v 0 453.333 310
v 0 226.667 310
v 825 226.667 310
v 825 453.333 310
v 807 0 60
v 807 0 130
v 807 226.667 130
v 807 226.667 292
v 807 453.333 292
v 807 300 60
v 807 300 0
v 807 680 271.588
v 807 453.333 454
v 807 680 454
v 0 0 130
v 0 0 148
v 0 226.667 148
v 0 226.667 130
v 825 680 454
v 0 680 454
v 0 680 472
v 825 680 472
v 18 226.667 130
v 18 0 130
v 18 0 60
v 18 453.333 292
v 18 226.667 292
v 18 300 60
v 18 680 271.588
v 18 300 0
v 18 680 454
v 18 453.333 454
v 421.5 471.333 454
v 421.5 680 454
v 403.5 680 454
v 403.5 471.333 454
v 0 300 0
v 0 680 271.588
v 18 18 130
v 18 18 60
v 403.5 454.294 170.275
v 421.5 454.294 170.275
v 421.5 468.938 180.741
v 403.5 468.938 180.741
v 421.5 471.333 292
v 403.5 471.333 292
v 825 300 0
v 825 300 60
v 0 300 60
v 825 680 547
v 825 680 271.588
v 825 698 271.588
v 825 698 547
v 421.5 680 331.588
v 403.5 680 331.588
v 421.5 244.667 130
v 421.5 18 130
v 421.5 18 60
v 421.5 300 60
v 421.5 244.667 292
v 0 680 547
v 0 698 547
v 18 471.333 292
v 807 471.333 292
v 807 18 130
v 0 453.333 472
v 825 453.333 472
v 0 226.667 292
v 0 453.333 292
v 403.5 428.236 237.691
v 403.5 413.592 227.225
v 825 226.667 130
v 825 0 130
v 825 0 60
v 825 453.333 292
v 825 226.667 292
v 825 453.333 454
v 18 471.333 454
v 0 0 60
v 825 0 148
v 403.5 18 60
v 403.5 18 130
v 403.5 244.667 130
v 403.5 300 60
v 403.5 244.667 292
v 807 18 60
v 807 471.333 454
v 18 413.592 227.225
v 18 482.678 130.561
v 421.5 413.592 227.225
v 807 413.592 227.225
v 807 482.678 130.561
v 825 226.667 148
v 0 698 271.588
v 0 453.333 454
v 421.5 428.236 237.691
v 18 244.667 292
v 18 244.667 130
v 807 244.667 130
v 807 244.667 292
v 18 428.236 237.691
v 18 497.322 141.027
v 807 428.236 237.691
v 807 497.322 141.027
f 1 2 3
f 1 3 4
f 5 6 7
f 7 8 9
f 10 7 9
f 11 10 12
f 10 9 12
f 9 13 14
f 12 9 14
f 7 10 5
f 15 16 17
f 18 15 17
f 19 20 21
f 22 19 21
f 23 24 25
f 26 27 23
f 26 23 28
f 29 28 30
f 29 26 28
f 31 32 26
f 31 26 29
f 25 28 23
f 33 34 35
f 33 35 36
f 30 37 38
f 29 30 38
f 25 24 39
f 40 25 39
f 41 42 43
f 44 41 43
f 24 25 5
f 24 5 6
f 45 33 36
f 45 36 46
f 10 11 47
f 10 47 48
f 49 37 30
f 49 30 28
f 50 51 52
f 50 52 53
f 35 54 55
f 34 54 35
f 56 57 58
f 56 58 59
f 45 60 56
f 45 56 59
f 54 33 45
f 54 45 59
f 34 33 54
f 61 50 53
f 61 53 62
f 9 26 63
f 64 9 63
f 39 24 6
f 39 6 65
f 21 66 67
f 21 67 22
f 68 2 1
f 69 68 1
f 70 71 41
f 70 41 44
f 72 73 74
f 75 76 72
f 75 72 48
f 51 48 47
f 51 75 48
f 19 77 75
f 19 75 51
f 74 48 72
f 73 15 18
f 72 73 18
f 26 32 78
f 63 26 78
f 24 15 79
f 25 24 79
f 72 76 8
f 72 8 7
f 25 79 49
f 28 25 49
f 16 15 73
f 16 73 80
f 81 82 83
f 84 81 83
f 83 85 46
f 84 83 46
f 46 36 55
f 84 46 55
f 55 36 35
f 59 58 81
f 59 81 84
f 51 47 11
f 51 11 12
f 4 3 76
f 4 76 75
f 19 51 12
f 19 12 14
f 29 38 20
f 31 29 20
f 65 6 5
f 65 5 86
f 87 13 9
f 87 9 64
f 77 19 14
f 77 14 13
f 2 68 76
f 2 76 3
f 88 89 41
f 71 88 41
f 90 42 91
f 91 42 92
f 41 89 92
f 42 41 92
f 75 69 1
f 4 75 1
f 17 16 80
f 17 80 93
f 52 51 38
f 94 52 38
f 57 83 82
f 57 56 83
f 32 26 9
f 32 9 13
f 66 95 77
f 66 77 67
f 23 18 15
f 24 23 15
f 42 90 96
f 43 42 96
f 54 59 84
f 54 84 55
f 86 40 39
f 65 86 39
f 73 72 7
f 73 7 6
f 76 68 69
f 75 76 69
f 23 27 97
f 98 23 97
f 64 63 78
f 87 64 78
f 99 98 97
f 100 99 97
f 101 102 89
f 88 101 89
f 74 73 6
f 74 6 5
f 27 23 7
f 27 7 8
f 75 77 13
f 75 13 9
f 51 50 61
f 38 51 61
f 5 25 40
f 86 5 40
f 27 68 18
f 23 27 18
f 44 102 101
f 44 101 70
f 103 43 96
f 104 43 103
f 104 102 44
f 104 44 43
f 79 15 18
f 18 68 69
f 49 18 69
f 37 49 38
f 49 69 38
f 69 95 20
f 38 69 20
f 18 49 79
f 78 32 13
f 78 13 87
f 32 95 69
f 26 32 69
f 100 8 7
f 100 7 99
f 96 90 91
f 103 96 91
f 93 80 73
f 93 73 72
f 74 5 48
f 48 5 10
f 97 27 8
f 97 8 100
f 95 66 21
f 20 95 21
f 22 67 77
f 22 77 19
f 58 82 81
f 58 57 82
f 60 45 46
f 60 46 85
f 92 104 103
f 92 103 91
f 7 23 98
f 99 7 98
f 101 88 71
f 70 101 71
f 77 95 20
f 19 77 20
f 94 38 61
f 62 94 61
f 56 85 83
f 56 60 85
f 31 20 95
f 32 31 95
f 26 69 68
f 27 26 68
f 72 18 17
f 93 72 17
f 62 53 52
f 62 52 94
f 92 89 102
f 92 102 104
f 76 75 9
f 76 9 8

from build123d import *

# Parameters (mm, degrees)
F0_W           = 226.6666666667
F0_H           = 18
F1_DEPTH       = 825
F4_DEPTH       = 18
F8_W           = 18
F8_H           = 130
F9_DEPTH       = 789
F8_H_2         = 162
F10_W          = 825
F10_H          = 275.4117647059
F11_DEPTH      = 18
F2_W           = 300
F2_H           = 60
F12_DEPTH      = 825.001
F14_DEPTH      = 9
F16_W          = 789
F16_H          = 18
F17_DEPTH      = 48.8143056074
F17_DEPTH_BACK = 70


with BuildPart() as f1:
    # F0 (on Right) → F1 (new body)
    with BuildSketch(Plane.YZ):
        with Locations((340, 301)):
            Rectangle(F0_W, F0_H)
    extrude(amount=F1_DEPTH)


with BuildPart() as f1b:
    # F0 (on Right) → F1, piece 2 (new body)
    with BuildSketch(Plane.YZ):
        with Locations((566.6666666667, 463)):
            Rectangle(F0_W, F0_H)
    extrude(amount=F1_DEPTH)


with BuildPart() as f1c:
    # F0 (on Right) → F1, piece 3 (new body)
    with BuildSketch(Plane.YZ):
        with Locations((113.3333333333, 139)):
            Rectangle(F0_W, F0_H)
    extrude(amount=F1_DEPTH)


with BuildPart() as f4:
    # F3 (on Right) → F4 (new body)
    with BuildSketch(Plane.YZ):
        Polygon((0, 0), (300, 0), (680, 271.5882352941), (680, 454), (453.3333333333, 454), (453.3333333333, 292), (226.6666666667, 292), (226.6666666667, 130), (0, 130), align=None)
    extrude(amount=F4_DEPTH)


with BuildPart() as f7_1:
    # F7: instance of F4
    add(f4.part.mirror(Plane.YZ.offset(412.5)))


with BuildPart() as f9:
    # F8 (on face) → F9 (new body, through all)
    with BuildSketch(Plane.YZ.offset(18)):
        with Locations((9, 65)):
            Rectangle(F8_W, F8_H)
    extrude(amount=F9_DEPTH)


with BuildPart() as f9b:
    # F8 (on face) → F9, piece 2 (new body, through all)
    with BuildSketch(Plane.YZ.offset(18)):
        with Locations((235.6666666667, 211)):
            Rectangle(F8_W, F8_H_2)
    extrude(amount=F9_DEPTH)


with BuildPart() as f9c:
    # F8 (on face) → F9, piece 3 (new body, through all)
    with BuildSketch(Plane.YZ.offset(18)):
        with Locations((462.3333333333, 373)):
            Rectangle(F8_W, F8_H_2)
    extrude(amount=F9_DEPTH)


with BuildPart() as f11:
    # F10 (on face) → F11 (new body)
    with BuildSketch(Plane(origin=(0, 680, 0), x_dir=(-1, 0, 0), z_dir=(0, 1, 0))):
        with Locations((-412.5, 409.2941176471)):
            Rectangle(F10_W, F10_H)
    extrude(amount=F11_DEPTH)


with BuildPart() as f12_tool:
    # F2 (on Right) → F12 (new body, through all)
    with BuildSketch(Plane.YZ):
        with Locations((150, 30)):
            Rectangle(F2_W, F2_H)
    extrude(amount=F12_DEPTH)


with BuildPart() as f4_1:
    add(f4.part)

    # F12: cut by f12_tool
    add(f12_tool.part, mode=Mode.SUBTRACT)


with BuildPart() as f7_1_1:
    add(f7_1.part)

    # F12: cut by f12_tool
    add(f12_tool.part, mode=Mode.SUBTRACT)


with BuildPart() as f9_1:
    add(f9.part)

    # F12: cut by f12_tool
    add(f12_tool.part, mode=Mode.SUBTRACT)


with BuildPart() as f14:
    # F13 (on plane+point) → F14 (new body, symmetric)
    with BuildSketch(Plane.YZ.offset(412.5)):
        Polygon((18, 130), (18, 60), (300, 60), (680, 331.5882352941), (680, 454), (471.3333333333, 454), (471.3333333333, 292), (244.6666666667, 292), (244.6666666667, 130), align=None)
    extrude(amount=F14_DEPTH, both=True)


with BuildPart() as f17:
    # F16 (on face) → F17 (new body, two sides)
    with BuildSketch(Plane(origin=(0, 73.0465104295, -102.2049940166), x_dir=(1, 0, 0), z_dir=(0, 0.5814645227, -0.8135717601))) as f17_sk:
        with Locations((412.5, -477.60962426)):
            Rectangle(F16_W, F16_H)
    extrude(amount=F17_DEPTH)
    extrude(f17_sk.sketch, amount=-F17_DEPTH_BACK)

    # F18: cut F14
    add(f14.part, mode=Mode.SUBTRACT)


solid = Compound([f1.part, f1b.part, f1c.part, f9b.part, f9c.part, f11.part, f4_1.part, f7_1_1.part, f9_1.part, f14.part, f17.part])
